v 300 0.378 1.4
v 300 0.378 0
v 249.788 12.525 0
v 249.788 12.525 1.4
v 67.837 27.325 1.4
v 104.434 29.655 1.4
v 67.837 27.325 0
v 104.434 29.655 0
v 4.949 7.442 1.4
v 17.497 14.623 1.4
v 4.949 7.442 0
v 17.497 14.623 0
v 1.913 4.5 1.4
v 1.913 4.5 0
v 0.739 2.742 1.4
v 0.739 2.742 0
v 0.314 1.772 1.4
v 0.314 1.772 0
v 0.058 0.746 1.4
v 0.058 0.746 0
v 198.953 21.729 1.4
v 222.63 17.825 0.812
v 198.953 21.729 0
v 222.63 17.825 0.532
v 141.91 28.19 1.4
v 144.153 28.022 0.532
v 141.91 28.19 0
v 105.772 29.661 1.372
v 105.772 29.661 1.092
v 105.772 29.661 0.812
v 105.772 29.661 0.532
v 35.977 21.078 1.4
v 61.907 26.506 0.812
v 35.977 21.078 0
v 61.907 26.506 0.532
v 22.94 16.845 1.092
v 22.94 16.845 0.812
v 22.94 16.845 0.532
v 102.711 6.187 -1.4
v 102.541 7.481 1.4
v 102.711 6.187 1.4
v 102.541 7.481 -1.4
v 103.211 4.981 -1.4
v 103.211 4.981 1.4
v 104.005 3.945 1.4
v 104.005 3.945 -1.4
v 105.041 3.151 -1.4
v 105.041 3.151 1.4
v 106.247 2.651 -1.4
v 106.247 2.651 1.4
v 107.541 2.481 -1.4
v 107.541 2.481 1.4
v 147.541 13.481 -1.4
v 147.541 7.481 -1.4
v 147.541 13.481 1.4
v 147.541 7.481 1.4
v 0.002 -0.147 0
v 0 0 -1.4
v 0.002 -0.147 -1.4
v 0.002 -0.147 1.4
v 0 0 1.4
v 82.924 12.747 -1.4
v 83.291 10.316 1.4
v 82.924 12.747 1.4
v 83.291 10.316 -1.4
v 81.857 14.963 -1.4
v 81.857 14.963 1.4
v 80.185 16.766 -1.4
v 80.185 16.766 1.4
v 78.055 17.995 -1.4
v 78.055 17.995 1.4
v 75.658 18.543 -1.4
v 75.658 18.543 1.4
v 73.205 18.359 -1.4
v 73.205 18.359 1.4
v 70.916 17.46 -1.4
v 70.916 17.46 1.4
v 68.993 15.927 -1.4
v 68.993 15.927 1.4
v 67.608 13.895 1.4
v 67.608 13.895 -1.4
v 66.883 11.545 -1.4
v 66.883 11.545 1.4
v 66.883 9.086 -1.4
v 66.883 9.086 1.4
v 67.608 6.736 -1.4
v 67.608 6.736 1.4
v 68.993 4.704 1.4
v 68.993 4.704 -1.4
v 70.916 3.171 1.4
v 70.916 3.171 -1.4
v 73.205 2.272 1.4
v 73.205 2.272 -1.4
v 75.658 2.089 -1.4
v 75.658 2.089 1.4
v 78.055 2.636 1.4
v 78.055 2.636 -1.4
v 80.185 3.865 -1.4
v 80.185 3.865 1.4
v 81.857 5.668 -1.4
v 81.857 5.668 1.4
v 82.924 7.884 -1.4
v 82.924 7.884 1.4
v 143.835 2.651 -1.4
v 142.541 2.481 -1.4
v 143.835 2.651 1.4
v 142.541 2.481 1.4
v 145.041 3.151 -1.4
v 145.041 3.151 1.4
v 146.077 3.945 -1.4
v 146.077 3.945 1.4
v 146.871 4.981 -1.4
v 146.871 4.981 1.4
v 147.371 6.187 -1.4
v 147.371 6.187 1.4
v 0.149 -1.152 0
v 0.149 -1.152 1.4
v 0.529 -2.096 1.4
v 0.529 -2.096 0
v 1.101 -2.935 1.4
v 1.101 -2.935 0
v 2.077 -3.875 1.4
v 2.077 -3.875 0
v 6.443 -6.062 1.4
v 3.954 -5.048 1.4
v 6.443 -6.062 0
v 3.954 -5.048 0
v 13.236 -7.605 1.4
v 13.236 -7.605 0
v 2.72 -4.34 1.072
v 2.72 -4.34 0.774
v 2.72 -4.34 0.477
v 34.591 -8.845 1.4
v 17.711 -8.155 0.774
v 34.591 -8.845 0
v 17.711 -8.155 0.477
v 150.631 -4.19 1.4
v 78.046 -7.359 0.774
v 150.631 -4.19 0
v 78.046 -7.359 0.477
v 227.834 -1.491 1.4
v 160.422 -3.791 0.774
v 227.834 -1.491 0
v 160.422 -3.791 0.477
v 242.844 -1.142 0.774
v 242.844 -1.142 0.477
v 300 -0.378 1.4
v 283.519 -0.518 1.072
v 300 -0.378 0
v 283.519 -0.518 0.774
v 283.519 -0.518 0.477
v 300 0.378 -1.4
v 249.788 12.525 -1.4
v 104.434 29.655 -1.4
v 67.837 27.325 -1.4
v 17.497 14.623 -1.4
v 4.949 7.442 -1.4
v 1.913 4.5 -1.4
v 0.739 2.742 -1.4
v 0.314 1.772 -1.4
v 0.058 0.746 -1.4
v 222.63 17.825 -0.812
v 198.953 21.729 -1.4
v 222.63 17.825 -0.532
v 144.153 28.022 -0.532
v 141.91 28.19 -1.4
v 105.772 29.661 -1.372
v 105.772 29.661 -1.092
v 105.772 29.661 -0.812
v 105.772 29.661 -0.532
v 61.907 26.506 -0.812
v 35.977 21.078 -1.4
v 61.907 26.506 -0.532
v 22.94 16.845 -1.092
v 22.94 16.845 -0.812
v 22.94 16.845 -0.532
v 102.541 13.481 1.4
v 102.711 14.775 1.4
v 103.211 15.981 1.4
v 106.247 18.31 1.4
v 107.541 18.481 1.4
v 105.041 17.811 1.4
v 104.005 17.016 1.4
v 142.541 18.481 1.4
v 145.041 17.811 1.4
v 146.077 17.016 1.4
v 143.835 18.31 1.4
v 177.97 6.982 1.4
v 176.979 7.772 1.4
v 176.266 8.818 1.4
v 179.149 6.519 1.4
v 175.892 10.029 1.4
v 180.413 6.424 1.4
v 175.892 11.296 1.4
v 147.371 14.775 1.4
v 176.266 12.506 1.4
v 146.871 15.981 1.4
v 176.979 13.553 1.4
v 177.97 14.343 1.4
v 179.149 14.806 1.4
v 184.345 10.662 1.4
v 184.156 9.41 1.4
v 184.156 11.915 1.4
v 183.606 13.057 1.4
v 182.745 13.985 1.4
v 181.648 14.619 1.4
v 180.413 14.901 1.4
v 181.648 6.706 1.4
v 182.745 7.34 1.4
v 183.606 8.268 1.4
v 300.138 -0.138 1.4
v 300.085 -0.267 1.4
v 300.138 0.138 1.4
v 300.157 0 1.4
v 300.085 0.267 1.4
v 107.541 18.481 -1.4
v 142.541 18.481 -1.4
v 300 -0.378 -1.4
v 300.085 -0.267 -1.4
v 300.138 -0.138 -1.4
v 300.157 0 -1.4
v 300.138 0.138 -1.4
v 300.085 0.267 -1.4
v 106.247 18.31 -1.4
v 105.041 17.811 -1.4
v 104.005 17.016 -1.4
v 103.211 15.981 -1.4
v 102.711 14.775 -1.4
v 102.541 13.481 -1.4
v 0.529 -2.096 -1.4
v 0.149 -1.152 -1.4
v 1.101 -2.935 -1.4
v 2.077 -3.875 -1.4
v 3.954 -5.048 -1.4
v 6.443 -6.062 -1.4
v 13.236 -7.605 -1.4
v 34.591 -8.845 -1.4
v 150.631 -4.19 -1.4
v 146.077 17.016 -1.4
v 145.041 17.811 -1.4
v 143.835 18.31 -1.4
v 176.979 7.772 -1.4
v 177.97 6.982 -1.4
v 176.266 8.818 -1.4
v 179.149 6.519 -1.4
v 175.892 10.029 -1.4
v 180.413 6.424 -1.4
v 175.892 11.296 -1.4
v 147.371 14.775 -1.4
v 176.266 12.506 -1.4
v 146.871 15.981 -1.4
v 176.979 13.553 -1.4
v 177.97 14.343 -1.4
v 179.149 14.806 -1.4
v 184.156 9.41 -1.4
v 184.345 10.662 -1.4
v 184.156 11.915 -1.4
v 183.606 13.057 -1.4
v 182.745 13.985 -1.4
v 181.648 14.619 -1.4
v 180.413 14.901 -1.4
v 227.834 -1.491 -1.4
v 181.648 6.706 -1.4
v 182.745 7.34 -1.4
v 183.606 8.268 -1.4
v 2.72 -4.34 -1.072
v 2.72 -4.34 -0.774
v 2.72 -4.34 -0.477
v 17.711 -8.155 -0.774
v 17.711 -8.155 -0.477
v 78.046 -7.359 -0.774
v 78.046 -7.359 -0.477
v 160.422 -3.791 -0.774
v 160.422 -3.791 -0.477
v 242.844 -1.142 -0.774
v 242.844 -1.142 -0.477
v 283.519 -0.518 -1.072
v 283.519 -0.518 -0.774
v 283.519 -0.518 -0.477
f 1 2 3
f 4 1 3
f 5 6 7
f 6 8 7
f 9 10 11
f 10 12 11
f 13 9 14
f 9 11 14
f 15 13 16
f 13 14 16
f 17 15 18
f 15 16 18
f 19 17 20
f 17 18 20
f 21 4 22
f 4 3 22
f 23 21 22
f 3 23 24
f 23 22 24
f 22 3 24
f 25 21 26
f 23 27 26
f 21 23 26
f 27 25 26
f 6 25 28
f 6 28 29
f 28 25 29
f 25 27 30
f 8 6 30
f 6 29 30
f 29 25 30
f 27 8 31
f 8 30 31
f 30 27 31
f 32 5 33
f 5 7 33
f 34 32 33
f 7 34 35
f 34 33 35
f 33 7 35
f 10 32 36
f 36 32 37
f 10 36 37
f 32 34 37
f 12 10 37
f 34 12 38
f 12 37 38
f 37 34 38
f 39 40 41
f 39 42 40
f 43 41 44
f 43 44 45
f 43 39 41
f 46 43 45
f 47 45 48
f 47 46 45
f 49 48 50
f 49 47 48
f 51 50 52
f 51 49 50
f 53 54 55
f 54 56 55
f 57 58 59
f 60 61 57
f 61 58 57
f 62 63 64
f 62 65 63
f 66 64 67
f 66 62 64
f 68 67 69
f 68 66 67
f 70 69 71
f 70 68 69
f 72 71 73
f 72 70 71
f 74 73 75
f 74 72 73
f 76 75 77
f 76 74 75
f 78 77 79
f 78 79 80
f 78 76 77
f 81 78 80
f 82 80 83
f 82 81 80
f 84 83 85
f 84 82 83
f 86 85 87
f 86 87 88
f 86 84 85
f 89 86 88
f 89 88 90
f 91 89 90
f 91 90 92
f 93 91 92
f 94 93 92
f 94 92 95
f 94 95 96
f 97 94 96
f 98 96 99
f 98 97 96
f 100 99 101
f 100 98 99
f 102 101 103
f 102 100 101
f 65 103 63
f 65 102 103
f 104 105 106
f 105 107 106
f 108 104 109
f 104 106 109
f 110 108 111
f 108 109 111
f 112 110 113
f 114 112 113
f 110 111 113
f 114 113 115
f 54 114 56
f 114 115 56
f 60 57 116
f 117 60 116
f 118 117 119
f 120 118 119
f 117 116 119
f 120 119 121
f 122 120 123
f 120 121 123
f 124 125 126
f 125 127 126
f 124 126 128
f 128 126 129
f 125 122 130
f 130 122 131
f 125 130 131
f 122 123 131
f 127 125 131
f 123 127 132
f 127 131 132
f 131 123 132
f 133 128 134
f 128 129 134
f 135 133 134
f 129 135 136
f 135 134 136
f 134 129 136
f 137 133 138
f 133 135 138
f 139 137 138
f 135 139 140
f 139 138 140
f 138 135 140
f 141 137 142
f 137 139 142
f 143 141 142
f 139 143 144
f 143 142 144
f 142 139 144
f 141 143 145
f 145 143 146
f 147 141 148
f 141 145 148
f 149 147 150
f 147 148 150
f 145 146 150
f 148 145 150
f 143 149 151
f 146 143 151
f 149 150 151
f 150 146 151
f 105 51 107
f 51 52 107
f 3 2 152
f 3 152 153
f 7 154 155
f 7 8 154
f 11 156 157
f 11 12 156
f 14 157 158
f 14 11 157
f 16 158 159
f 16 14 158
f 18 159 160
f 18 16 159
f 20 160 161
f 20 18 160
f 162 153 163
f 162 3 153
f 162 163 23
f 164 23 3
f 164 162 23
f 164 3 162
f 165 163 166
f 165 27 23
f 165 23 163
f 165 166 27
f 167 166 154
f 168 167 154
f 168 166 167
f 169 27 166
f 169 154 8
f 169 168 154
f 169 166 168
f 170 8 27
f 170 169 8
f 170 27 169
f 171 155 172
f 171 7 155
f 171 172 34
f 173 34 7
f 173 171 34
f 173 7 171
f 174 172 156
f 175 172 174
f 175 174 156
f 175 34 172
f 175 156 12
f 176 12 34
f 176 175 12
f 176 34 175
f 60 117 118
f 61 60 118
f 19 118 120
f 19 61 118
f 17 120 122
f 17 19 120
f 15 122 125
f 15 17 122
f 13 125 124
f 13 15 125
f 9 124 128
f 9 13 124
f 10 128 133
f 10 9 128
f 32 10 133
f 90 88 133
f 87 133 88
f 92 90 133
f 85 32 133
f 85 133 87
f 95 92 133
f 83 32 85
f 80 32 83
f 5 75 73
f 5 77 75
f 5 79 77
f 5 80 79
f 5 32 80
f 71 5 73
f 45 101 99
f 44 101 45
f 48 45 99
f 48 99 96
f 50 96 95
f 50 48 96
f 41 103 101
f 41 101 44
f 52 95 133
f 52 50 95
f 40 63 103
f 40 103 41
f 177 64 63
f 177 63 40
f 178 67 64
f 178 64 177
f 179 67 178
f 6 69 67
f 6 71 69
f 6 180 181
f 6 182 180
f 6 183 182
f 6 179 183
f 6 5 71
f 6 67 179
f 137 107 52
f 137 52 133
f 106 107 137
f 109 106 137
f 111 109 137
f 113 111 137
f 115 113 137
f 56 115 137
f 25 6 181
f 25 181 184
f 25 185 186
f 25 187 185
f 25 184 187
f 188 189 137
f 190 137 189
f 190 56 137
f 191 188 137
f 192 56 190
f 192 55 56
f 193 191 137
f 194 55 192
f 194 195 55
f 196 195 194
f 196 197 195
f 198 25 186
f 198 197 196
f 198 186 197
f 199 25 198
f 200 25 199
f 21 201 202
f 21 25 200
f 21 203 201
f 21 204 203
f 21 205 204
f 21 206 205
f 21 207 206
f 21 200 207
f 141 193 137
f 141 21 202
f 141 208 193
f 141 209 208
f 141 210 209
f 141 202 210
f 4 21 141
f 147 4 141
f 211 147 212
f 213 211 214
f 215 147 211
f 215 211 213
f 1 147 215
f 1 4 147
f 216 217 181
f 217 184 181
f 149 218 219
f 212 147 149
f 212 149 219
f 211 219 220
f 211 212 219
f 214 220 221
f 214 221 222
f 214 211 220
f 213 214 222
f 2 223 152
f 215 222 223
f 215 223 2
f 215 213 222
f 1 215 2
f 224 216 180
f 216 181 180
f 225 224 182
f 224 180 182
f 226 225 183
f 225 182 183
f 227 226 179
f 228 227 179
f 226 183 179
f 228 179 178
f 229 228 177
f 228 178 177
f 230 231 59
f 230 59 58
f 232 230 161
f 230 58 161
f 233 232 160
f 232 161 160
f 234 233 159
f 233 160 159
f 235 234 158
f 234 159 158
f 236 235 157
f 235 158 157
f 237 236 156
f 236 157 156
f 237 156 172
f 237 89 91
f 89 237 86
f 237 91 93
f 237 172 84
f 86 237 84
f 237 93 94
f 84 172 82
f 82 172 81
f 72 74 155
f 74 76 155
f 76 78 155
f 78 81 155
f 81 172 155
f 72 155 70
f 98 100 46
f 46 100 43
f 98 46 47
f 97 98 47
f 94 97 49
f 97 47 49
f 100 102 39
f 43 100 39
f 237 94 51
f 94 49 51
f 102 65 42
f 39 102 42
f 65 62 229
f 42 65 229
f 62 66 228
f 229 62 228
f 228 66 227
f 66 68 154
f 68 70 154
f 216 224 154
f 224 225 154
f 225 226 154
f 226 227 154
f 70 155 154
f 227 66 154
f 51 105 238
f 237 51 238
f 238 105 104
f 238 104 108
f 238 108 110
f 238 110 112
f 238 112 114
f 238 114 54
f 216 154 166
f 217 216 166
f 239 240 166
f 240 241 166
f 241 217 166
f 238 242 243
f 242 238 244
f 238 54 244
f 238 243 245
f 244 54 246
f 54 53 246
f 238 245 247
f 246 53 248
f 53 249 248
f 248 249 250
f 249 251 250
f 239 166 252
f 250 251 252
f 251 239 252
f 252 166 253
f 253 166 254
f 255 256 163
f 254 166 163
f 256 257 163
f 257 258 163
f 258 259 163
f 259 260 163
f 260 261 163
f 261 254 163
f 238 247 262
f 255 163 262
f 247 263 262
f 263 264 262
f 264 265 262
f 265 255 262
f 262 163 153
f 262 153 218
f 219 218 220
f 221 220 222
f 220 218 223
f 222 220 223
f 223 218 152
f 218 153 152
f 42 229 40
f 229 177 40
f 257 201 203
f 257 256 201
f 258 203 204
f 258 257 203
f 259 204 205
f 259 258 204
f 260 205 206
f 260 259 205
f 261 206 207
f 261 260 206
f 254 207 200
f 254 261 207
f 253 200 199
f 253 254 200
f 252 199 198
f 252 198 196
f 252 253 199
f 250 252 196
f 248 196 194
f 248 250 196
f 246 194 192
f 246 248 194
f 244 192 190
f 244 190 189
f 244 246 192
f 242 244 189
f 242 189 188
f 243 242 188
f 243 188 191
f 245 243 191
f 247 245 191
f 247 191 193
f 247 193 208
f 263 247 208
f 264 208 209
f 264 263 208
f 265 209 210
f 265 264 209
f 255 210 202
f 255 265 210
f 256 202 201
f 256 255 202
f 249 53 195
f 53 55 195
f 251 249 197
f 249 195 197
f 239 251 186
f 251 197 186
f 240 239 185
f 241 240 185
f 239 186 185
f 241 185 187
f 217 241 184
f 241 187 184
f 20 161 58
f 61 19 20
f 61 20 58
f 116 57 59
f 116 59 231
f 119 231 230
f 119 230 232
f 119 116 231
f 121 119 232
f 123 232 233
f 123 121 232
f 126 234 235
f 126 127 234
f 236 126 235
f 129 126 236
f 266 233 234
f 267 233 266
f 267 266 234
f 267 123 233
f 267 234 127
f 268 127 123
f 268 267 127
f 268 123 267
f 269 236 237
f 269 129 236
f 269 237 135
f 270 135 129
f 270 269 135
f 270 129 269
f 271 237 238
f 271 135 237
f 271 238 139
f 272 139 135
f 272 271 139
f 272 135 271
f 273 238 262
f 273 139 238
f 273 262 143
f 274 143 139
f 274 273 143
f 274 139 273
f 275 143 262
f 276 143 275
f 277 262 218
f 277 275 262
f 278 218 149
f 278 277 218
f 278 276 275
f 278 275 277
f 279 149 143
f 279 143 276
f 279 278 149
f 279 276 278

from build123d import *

# Parameters (mm, degrees)
SKETCH_1_R      = 8.25
SKETCH_1_R_2    = 4.25
EXTRUDE_1_DEPTH = 1.4


with BuildPart() as part:
    # Эскиз1 → Бобышка-Вытянуть1 (new body, symmetric)
    with BuildSketch(Plane.XY):
        with BuildLine():
            Line((0.05757, 0.74571), (0, 0))
            Line((0, 0), (0.00249, -0.14724))
            add(Edge.make_bspline(
                [(0.00249, -0.14724), (0.028864169, -0.445513844), (0.08330578, -1.0612113), (0.42267139, -1.966638227), (0.976281815, -2.838072896), (1.756459788, -3.647133325), (2.749077941, -4.393198402), (3.967143746, -5.082935859), (5.442296909, -5.728408867), (7.235698246, -6.338630634), (9.442776227, -6.918379999), (12.202598128, -7.466059916), (15.690525654, -7.967542476), (20.073738499, -8.391548086), (25.427942493, -8.696814173), (31.679981306, -8.851966619), (38.636878275, -8.851508296), (46.077368111, -8.713723896), (53.829146121, -8.46796963), (61.783851715, -8.143744238), (69.877177119, -7.766789504), (78.062513527, -7.359422717), (86.292927251, -6.940806212), (94.525650691, -6.527616544), (102.732598332, -6.133141503), (110.918529108, -5.765943991), (119.106037428, -5.438377986), (127.316854086, -5.133929605), (135.563054016, -4.803707911), (143.837285105, -4.467811421), (152.128632568, -4.128080756), (160.417875856, -3.790434721), (168.698244489, -3.458856865), (176.966416514, -3.13670755), (185.223122893, -2.826751698), (193.470052961, -2.531243905), (201.709043695, -2.251960889), (209.941894226, -1.990371725), (218.170315159, -1.747653748), (226.395881355, -1.524460053), (234.619974201, -1.321335461), (242.843439472, -1.138340626), (253.799028348, -0.921290824), (264.723718399, -0.743927691), (275.541156207, -0.603511416), (283.304824625, -0.51781703), (290.376932295, -0.451824554), (295.870764013, -0.407443063), (298.944589157, -0.385525491), (300, -0.378)],
                knots=[0, 0, 0, 0, 0.002951555, 0.006092605, 0.0094509, 0.013105035, 0.017145832, 0.021696099, 0.026921577, 0.033052787, 0.04041788, 0.049480062, 0.060872195, 0.075263112, 0.093030359, 0.113913711, 0.137122623, 0.161846788, 0.187529051, 0.213844768, 0.24060404, 0.267679501, 0.294919064, 0.322129352, 0.349224887, 0.376200636, 0.403190533, 0.430285051, 0.457482609, 0.484832061, 0.51220601, 0.539574277, 0.566902094, 0.594185889, 0.621429901, 0.648639753, 0.675821648, 0.702981565, 0.730124952, 0.757257324, 0.784383539, 0.811507209, 0.838628701, 0.892783781, 0.919594556, 0.94565005, 0.969591155, 0.989558995, 1, 1, 1, 1], degree=3))
            ThreePointArc((300, -0.378), (300.156572727, 0), (300, 0.378))
            add(Edge.make_bspline(
                [(300, 0.378), (298.986801288, 0.654023781), (296.064210837, 1.450219491), (290.8695985, 2.830006863), (284.219713445, 4.545150437), (276.935901935, 6.357610605), (269.347101537, 8.175439233), (261.636652195, 9.949932759), (253.874886054, 11.663682068), (246.086893811, 13.310849919), (238.281565095, 14.889420872), (230.462843896, 16.398357509), (222.633143967, 17.836911964), (214.794406789, 19.204085734), (206.94847769, 20.498865738), (199.097180514, 21.719793409), (191.242416875, 22.865402178), (183.386166154, 23.933862723), (175.530527282, 24.923138619), (167.67763175, 25.830811336), (159.830204076, 26.654405099), (151.990419631, 27.390865714), (144.164125102, 28.036767919), (136.354280569, 28.589612789), (128.583278445, 29.040291112), (120.889314832, 29.398079412), (113.294103258, 29.623979722), (105.787101592, 29.68811478), (98.338851666, 29.590618972), (90.93662471, 29.32921657), (83.58443153, 28.898261785), (76.290492602, 28.293607633), (69.066227461, 27.50993599), (61.926915226, 26.542878626), (54.893280374, 25.387877318), (47.995029113, 24.042445667), (41.277503811, 22.507579481), (34.812458524, 20.793138729), (28.71095809, 18.926237906), (23.124814608, 16.961123321), (18.21491807, 14.980002525), (14.088570948, 13.074733194), (10.751246243, 11.315492838), (8.113069416, 9.730323839), (6.040451698, 8.309565666), (4.40603392, 7.025075597), (3.110521348, 5.845566442), (2.085810802, 4.743114892), (1.283844996, 3.697135648), (0.685974492, 2.689946523), (0.258928679, 1.716942476), (0.122706698, 1.059890033), (0.05757, 0.74571)],
                knots=[0, 0, 0, 0, 0.0101622, 0.029313053, 0.052011605, 0.076619468, 0.101948061, 0.127526132, 0.153184131, 0.178867888, 0.204557903, 0.230245712, 0.255925967, 0.281594302, 0.30724642, 0.332878042, 0.358484538, 0.384061186, 0.409602822, 0.435103874, 0.460559416, 0.485959195, 0.51130307, 0.536551515, 0.561723366, 0.586628867, 0.611085431, 0.6352512, 0.659272176, 0.683163753, 0.706922144, 0.73053591, 0.7539832, 0.77723469, 0.800246382, 0.822950709, 0.845237155, 0.866915896, 0.887662335, 0.906968281, 0.924203157, 0.938878975, 0.950931611, 0.960693484, 0.968646729, 0.975232933, 0.980794744, 0.985583761, 0.989781539, 0.993521313, 0.996902113, 1, 1, 1, 1], degree=3))
        make_face()
        with Locations((75.041010682, 10.315576588)):
            Circle(SKETCH_1_R, mode=Mode.SUBTRACT)
        with Locations((180.094939636, 10.662445034)):
            Circle(SKETCH_1_R_2, mode=Mode.SUBTRACT)
        with BuildLine():
            Line((107.541010682, 2.480667246), (142.541010682, 2.480667246))
            ThreePointArc((142.541010682, 2.480667246), (146.076544588, 3.94513334), (147.541010682, 7.480667246))
            Line((147.541010682, 7.480667246), (147.541010682, 13.480667246))
            ThreePointArc((147.541010682, 13.480667246), (146.076544588, 17.016201152), (142.541010682, 18.480667246))
            Line((142.541010682, 18.480667246), (107.541010682, 18.480667246))
            ThreePointArc((107.541010682, 18.480667246), (104.005476776, 17.016201152), (102.541010682, 13.480667246))
            Line((102.541010682, 13.480667246), (102.541010682, 7.480667246))
            ThreePointArc((102.541010682, 7.480667246), (104.005476776, 3.94513334), (107.541010682, 2.480667246))
        make_face(mode=Mode.SUBTRACT)
    extrude(amount=EXTRUDE_1_DEPTH, both=True)


solid = part.part
